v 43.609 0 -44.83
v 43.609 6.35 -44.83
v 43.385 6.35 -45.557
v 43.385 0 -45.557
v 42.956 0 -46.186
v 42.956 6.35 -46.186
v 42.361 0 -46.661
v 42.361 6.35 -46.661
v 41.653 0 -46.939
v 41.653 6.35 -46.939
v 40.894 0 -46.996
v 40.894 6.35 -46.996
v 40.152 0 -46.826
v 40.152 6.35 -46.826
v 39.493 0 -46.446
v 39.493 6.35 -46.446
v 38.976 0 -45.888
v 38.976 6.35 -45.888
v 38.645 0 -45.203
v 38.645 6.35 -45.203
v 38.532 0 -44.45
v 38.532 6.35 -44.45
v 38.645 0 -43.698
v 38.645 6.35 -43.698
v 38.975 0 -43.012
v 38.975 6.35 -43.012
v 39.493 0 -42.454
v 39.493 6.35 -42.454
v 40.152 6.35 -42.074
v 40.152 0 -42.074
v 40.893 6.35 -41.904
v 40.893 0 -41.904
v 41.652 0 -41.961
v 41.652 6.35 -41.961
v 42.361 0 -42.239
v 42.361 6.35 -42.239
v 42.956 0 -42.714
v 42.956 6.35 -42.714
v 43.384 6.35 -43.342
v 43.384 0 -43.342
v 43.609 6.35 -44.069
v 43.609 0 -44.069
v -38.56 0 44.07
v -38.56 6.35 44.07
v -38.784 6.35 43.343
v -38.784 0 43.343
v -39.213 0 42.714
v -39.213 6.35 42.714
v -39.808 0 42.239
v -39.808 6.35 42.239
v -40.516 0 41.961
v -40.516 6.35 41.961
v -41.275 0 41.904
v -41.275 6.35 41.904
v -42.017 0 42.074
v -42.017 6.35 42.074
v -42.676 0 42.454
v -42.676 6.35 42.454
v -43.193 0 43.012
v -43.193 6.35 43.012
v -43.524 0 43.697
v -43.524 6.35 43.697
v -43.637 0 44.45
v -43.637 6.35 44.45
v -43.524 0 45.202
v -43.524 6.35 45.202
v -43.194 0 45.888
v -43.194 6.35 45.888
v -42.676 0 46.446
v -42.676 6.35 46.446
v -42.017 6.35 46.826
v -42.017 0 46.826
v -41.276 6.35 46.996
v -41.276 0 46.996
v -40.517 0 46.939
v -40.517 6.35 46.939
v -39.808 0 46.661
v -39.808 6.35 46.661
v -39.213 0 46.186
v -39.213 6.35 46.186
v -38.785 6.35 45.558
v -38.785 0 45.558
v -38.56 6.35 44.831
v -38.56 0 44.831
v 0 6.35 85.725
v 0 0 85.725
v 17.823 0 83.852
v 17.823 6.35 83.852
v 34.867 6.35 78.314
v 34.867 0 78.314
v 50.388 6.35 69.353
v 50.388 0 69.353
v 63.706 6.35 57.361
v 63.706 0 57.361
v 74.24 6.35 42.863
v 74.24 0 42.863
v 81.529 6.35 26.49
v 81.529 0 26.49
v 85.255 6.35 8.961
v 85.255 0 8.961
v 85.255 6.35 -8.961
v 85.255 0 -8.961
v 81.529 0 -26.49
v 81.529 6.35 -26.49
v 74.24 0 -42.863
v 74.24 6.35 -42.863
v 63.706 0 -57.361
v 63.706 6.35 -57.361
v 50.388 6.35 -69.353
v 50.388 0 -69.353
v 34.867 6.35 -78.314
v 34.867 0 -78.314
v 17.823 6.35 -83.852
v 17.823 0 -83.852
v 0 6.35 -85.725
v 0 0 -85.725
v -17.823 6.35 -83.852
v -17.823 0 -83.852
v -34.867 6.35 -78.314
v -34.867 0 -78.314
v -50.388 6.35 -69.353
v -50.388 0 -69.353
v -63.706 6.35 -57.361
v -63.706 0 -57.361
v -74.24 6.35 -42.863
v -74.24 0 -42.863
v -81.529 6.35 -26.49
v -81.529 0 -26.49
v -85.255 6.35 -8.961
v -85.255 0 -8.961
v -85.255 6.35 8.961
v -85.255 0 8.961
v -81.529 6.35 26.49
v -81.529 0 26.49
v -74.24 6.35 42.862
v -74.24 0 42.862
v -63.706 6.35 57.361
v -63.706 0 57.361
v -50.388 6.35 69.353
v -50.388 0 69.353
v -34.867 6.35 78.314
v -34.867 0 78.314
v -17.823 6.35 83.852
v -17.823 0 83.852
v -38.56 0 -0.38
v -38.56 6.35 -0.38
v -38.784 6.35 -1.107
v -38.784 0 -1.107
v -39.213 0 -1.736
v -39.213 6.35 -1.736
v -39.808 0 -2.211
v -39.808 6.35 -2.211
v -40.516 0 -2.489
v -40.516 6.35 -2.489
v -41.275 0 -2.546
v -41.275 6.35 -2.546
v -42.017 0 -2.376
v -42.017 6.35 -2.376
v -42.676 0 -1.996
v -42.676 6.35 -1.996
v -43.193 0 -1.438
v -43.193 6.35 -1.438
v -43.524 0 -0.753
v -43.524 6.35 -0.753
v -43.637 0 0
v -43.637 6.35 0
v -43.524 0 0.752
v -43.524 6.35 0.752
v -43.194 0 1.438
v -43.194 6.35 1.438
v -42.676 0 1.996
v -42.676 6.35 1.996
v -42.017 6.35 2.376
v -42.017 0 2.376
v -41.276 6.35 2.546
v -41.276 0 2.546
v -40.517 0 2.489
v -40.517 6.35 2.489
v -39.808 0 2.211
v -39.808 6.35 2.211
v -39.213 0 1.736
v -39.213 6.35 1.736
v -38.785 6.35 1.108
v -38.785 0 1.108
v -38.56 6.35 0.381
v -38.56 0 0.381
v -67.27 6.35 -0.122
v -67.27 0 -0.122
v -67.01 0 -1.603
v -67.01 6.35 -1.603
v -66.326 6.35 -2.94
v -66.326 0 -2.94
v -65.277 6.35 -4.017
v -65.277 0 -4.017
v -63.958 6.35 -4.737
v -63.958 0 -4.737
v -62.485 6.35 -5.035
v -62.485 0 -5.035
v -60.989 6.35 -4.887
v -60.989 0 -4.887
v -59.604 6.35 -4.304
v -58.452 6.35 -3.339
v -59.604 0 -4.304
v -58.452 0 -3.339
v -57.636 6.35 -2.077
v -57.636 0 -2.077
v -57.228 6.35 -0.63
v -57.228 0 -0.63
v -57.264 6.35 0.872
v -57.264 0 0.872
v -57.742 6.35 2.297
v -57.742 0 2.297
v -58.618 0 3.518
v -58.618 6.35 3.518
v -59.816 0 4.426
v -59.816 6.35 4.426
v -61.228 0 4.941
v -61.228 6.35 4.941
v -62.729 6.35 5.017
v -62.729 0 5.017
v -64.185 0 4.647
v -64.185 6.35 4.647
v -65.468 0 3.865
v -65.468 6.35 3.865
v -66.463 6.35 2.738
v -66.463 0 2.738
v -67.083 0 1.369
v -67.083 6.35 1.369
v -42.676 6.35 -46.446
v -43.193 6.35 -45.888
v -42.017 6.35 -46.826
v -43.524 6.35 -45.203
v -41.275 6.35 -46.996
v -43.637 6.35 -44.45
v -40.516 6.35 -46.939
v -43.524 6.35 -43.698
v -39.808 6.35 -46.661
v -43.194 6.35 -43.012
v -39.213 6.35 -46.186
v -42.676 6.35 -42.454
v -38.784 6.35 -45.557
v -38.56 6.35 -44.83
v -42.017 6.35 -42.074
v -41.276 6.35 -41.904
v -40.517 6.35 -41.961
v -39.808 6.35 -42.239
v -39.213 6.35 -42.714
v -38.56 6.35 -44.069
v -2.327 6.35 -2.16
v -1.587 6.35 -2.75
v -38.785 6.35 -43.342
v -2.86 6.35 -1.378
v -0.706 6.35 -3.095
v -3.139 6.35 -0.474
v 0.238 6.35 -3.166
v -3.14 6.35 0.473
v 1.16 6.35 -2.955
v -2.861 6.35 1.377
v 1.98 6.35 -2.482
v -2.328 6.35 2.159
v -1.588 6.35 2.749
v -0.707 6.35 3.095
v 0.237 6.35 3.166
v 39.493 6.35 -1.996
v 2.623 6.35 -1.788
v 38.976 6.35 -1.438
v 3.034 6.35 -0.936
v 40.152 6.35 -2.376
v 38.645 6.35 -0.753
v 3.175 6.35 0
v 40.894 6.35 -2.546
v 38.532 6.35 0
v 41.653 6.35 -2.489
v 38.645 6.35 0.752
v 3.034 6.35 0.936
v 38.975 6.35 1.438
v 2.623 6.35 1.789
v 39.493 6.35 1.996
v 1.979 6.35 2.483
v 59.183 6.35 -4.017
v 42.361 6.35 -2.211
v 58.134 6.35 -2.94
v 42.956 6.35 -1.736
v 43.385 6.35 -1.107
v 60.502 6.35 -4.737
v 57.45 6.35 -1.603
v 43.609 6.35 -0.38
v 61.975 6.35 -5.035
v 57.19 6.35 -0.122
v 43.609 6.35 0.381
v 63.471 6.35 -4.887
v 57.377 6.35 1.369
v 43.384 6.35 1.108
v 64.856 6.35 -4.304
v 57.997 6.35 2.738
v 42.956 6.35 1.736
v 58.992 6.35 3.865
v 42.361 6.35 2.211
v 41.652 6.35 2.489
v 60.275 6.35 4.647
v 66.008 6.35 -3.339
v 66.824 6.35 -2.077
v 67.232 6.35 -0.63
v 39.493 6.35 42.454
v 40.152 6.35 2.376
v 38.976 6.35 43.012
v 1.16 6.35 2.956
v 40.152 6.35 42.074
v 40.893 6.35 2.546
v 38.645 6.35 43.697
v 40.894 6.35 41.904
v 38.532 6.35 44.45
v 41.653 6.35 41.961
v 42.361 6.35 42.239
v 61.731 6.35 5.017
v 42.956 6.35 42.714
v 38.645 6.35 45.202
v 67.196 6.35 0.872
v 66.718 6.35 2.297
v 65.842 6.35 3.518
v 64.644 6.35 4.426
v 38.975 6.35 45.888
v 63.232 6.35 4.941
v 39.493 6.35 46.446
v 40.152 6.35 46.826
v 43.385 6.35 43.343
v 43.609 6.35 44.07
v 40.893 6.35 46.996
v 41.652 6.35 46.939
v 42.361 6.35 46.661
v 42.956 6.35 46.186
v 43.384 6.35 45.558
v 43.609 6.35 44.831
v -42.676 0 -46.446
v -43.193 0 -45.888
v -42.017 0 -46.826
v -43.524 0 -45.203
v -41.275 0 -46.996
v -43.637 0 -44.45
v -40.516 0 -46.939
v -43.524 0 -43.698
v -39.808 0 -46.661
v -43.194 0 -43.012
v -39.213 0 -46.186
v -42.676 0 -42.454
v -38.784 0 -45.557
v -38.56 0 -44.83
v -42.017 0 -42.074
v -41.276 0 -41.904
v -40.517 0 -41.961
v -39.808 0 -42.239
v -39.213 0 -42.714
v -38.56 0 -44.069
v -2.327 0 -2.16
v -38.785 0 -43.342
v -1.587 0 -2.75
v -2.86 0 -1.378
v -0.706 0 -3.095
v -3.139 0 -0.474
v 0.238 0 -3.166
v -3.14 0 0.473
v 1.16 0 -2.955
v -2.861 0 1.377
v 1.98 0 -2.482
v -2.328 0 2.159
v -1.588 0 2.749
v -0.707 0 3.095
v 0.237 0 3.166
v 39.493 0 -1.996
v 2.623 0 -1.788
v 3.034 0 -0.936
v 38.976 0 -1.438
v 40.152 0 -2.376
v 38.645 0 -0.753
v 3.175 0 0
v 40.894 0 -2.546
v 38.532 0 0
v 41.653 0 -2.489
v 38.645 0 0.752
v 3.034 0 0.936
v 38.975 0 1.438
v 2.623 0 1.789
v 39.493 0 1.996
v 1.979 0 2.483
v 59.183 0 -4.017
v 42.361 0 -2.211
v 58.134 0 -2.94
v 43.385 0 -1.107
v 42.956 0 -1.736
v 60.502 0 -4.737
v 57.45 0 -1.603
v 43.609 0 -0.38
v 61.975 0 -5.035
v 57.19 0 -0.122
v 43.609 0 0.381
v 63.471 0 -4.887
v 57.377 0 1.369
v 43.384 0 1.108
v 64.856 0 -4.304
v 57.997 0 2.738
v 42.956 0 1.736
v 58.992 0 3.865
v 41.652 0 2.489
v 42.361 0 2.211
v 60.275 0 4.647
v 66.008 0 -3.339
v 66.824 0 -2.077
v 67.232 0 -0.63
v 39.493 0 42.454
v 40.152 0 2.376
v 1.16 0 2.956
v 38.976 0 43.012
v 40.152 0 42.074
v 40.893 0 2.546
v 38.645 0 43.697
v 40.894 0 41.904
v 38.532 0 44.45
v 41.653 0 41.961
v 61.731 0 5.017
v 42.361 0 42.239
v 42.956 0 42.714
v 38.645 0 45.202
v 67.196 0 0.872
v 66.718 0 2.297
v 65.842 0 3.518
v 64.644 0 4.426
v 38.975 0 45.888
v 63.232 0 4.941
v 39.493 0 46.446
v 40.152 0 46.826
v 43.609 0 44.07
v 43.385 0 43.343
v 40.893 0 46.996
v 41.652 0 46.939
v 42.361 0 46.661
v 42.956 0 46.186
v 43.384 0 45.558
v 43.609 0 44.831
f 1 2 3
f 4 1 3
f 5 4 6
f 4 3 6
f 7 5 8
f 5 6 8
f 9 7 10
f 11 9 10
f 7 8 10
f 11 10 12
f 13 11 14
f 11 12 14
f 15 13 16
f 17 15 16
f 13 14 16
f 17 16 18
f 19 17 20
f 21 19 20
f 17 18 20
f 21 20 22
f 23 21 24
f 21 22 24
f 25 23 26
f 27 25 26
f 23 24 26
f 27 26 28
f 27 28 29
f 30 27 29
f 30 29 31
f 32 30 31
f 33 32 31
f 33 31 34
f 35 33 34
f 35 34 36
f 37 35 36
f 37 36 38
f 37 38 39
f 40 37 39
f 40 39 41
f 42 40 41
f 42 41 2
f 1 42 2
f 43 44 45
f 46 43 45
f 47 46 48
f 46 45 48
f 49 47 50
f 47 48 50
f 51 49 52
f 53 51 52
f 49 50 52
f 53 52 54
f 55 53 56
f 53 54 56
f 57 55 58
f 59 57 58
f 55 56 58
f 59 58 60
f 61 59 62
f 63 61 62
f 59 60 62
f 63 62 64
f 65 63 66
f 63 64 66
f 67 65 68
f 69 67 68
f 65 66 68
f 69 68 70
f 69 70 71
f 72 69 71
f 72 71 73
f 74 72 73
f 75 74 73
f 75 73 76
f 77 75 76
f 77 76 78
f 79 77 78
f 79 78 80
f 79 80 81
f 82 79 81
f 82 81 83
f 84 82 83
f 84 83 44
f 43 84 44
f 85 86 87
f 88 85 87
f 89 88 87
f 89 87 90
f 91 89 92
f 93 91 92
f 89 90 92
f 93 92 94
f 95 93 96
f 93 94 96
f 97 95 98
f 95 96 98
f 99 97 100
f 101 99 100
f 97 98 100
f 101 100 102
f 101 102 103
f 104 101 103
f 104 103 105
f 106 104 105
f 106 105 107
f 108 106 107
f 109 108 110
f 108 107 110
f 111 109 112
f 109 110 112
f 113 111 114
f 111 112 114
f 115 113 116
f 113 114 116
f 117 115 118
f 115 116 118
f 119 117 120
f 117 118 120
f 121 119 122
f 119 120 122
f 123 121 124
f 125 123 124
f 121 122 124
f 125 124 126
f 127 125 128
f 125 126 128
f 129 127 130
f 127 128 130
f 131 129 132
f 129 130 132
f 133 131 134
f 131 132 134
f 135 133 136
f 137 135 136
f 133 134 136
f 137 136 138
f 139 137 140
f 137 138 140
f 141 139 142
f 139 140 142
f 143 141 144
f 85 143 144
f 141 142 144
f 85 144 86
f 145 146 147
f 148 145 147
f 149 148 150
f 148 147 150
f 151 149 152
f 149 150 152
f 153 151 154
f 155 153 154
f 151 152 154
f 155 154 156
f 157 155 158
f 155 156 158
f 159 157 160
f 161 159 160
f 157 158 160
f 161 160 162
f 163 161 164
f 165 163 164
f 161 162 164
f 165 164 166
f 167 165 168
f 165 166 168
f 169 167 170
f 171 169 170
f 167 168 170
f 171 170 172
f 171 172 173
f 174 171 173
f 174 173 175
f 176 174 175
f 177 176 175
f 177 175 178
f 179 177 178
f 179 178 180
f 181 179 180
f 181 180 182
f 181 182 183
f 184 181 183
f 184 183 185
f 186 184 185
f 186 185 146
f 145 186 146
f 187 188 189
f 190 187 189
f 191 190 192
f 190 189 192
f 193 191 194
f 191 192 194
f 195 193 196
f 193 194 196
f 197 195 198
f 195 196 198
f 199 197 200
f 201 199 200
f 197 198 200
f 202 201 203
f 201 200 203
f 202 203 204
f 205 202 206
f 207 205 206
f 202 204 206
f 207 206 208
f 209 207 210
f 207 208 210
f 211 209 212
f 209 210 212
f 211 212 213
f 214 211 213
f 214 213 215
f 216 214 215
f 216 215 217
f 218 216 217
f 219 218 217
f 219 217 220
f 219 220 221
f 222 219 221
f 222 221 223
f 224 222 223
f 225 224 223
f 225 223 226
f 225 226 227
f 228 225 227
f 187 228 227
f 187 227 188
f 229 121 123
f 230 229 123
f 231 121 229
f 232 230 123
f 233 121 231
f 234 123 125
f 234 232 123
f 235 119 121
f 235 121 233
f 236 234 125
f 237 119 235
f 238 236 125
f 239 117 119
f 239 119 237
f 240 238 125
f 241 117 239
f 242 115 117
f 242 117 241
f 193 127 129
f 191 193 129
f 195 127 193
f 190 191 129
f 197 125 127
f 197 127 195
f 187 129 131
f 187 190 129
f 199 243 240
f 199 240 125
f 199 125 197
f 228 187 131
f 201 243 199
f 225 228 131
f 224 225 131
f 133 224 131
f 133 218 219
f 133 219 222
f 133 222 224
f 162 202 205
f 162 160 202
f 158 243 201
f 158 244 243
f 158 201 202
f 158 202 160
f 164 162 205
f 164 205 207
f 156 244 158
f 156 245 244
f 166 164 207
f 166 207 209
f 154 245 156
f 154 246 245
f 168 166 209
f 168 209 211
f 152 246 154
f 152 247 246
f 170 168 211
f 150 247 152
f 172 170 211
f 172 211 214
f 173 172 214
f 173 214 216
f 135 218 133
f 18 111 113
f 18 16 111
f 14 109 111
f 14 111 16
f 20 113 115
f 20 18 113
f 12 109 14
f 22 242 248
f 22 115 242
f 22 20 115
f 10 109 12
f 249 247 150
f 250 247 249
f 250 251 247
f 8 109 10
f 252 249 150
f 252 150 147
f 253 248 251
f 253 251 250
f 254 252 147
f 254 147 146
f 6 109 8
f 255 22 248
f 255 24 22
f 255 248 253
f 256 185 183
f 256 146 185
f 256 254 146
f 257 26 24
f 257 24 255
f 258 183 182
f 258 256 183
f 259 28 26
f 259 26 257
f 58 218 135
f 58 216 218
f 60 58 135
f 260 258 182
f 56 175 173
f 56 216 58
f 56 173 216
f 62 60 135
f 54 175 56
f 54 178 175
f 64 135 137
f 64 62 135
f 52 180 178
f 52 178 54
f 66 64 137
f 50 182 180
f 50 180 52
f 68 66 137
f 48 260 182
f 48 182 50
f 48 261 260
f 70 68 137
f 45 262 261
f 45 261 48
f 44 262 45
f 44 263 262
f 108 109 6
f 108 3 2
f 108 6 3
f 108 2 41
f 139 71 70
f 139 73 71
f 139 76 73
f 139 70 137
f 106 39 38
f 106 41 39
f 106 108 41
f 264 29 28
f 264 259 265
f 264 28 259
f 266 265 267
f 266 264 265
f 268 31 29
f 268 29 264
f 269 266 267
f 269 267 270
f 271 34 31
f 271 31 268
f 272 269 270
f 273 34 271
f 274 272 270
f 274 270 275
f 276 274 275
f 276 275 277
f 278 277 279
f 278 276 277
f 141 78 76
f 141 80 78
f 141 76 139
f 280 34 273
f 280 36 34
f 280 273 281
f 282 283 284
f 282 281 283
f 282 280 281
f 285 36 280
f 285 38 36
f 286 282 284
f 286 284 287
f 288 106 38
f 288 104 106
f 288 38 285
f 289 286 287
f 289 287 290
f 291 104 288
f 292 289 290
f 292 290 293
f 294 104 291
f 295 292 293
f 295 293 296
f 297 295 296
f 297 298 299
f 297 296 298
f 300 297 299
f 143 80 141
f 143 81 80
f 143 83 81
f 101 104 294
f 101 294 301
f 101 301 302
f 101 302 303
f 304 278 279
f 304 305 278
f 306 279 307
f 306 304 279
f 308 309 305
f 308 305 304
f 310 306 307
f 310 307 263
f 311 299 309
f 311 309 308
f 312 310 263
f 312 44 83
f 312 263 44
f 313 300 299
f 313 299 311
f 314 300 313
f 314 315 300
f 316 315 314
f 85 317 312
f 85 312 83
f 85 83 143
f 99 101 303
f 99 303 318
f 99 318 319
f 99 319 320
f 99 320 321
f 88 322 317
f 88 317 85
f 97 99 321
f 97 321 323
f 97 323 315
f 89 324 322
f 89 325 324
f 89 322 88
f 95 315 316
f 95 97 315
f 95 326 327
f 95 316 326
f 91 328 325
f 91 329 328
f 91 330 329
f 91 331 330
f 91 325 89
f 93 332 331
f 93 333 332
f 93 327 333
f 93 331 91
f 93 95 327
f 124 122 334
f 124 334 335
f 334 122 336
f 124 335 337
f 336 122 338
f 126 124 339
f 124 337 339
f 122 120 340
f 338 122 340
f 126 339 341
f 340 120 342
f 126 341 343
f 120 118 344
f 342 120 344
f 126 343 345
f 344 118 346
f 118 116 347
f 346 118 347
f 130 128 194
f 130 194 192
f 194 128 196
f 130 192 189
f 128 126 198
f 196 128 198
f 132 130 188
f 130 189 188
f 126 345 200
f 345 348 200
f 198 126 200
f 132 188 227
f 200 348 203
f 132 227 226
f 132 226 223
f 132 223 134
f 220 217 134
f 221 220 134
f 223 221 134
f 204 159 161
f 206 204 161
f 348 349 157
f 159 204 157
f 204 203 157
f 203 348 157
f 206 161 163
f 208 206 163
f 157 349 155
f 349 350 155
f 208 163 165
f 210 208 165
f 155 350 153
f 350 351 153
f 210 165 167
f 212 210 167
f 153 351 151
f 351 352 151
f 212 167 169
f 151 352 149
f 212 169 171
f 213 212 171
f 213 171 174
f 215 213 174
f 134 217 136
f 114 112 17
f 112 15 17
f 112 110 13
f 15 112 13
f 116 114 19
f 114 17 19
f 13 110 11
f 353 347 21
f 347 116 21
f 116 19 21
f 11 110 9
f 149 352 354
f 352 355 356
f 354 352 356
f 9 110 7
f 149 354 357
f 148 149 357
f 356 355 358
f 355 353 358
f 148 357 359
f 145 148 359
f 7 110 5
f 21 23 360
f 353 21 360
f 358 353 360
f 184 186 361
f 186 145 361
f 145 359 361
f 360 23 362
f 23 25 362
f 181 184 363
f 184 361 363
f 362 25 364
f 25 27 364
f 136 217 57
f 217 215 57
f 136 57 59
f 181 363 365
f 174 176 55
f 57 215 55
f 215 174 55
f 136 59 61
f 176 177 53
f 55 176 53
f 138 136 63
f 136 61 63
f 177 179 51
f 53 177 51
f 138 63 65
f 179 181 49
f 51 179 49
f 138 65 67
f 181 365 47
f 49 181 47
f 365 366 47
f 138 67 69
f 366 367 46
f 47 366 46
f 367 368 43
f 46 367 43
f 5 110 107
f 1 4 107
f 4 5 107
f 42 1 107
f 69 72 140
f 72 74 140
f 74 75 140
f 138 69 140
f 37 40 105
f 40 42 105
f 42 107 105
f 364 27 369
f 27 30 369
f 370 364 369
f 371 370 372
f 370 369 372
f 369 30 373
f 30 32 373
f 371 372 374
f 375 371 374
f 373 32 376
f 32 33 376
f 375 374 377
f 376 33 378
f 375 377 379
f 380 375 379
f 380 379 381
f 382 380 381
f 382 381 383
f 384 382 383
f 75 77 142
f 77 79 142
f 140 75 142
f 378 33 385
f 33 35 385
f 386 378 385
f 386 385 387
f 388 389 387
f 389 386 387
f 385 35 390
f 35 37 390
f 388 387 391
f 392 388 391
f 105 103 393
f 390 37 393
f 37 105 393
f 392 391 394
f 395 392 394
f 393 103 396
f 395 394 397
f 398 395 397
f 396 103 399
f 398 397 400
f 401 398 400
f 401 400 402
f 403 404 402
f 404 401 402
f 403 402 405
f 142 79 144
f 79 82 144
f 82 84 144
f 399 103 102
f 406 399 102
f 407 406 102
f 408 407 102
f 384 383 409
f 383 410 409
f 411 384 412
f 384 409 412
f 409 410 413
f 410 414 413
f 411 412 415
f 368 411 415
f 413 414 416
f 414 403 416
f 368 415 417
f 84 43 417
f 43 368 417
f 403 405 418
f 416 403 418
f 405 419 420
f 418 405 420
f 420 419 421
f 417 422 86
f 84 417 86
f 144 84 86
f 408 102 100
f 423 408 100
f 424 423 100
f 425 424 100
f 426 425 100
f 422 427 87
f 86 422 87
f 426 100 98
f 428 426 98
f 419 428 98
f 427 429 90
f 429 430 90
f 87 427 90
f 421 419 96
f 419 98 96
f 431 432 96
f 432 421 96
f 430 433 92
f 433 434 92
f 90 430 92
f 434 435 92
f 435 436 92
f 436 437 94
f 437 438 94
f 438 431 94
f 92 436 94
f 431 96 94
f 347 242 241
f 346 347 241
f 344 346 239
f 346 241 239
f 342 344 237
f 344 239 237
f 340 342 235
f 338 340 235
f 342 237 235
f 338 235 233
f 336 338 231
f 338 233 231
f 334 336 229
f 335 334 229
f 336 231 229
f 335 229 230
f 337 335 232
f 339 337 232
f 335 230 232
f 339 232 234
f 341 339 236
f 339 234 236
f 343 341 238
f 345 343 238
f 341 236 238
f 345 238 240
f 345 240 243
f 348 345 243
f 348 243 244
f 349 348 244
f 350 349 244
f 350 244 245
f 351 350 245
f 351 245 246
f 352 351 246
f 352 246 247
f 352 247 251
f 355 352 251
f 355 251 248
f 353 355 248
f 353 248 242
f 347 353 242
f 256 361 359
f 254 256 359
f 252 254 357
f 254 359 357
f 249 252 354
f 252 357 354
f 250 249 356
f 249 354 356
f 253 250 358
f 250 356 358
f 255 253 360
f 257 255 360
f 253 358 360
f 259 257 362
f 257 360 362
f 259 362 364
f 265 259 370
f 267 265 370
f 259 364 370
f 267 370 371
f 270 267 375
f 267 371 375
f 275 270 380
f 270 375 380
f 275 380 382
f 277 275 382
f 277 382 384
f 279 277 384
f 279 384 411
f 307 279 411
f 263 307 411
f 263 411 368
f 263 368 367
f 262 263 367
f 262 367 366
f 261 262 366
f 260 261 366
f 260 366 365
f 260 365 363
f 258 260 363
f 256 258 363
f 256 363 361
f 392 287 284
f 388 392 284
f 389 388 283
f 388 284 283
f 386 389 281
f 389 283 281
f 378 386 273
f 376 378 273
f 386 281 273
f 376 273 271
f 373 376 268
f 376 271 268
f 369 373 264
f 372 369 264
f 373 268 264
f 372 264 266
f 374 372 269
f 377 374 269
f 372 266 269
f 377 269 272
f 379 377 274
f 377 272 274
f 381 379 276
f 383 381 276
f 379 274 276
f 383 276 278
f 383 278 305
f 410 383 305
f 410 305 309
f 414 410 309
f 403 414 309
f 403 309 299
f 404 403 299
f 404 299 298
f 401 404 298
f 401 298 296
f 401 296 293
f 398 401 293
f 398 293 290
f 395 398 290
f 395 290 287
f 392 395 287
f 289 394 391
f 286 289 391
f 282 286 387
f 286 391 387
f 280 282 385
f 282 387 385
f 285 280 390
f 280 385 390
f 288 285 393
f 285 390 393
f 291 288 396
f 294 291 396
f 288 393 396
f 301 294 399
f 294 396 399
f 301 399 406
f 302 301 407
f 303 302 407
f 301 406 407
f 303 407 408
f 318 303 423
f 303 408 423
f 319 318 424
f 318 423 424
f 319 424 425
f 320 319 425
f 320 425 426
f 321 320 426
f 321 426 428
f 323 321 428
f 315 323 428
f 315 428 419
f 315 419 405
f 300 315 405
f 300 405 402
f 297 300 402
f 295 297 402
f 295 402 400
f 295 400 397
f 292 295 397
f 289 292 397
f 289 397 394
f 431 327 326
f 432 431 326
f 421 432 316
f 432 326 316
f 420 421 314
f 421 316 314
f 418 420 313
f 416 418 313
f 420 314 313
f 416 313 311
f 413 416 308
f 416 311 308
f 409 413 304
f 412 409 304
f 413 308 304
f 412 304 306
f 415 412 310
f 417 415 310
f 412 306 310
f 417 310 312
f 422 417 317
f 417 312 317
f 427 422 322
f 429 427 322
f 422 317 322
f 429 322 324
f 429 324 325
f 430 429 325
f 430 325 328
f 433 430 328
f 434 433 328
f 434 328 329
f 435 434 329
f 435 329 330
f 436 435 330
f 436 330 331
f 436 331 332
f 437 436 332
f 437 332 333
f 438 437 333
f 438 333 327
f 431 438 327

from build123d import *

# Parameters (mm, degrees)
SKETCH1_R                          = 85.725
BOSS_EXTRUDE1_DEPTH                = 6.35
F_3_8_CLEARANCE_HOLE1_D            = 10.0838
F_1_4_0_25_CLEARANCE_DOWEL_HOLE1_D = 6.35
F_10_CLEARANCE_HOLE1_D             = 5.1054
F_10_CLEARANCE_HOLE1_DEPTH         = 6.35


with BuildPart() as part:
    # Sketch1 → Boss-Extrude1 (new body)
    with BuildSketch(Plane(origin=(0, 0, 0), x_dir=(1, 0, 0), z_dir=(0, 1, 0))):
        with Locations(Location((0, 0, 0), (0, 0, 270))):
            Circle(SKETCH1_R)
    extrude(amount=BOSS_EXTRUDE1_DEPTH)

    # 3/8 Clearance Hole1 (through all)
    with Locations(Plane(origin=(0, 6.35, 0), x_dir=(0.9997060077974086, 0, 0.024246607469250614), z_dir=(0, 1, 0))):
        with Locations((-62.211704865, -1.508866383), (62.211704865, 1.508866383)):
            Hole(F_3_8_CLEARANCE_HOLE1_D / 2)

    # 1/4 (0.25) Clearance Dowel Hole1 (through all)
    with Locations(Plane(origin=(43.377433792, 6.35, -259.284531313), x_dir=(0.9888467421616725, 0, -0.14893663255306588), z_dir=(0, 1, 0))):
        with Locations((-81.510599056, -249.932175164)):
            Hole(F_1_4_0_25_CLEARANCE_DOWEL_HOLE1_D / 2)

    # #10 Clearance Hole1
    with Locations(Plane(origin=(43.377433792, 0, -259.284531313), x_dir=(-0.9888467421616725, 0, 0.14893663255306588), z_dir=(0, -1, 0))):
        with Locations((143.046531821, -240.66384852), (19.974666291, -259.200501808), (40.884325078, -256.051162244), (34.264091761, -212.096924555), (115.516639717, -199.858950395), (128.757106351, -287.767425773), (122.136873034, -243.813188084), (47.504558395, -300.005399933)):
            Hole(F_10_CLEARANCE_HOLE1_D / 2, depth=F_10_CLEARANCE_HOLE1_DEPTH)


solid = part.part
